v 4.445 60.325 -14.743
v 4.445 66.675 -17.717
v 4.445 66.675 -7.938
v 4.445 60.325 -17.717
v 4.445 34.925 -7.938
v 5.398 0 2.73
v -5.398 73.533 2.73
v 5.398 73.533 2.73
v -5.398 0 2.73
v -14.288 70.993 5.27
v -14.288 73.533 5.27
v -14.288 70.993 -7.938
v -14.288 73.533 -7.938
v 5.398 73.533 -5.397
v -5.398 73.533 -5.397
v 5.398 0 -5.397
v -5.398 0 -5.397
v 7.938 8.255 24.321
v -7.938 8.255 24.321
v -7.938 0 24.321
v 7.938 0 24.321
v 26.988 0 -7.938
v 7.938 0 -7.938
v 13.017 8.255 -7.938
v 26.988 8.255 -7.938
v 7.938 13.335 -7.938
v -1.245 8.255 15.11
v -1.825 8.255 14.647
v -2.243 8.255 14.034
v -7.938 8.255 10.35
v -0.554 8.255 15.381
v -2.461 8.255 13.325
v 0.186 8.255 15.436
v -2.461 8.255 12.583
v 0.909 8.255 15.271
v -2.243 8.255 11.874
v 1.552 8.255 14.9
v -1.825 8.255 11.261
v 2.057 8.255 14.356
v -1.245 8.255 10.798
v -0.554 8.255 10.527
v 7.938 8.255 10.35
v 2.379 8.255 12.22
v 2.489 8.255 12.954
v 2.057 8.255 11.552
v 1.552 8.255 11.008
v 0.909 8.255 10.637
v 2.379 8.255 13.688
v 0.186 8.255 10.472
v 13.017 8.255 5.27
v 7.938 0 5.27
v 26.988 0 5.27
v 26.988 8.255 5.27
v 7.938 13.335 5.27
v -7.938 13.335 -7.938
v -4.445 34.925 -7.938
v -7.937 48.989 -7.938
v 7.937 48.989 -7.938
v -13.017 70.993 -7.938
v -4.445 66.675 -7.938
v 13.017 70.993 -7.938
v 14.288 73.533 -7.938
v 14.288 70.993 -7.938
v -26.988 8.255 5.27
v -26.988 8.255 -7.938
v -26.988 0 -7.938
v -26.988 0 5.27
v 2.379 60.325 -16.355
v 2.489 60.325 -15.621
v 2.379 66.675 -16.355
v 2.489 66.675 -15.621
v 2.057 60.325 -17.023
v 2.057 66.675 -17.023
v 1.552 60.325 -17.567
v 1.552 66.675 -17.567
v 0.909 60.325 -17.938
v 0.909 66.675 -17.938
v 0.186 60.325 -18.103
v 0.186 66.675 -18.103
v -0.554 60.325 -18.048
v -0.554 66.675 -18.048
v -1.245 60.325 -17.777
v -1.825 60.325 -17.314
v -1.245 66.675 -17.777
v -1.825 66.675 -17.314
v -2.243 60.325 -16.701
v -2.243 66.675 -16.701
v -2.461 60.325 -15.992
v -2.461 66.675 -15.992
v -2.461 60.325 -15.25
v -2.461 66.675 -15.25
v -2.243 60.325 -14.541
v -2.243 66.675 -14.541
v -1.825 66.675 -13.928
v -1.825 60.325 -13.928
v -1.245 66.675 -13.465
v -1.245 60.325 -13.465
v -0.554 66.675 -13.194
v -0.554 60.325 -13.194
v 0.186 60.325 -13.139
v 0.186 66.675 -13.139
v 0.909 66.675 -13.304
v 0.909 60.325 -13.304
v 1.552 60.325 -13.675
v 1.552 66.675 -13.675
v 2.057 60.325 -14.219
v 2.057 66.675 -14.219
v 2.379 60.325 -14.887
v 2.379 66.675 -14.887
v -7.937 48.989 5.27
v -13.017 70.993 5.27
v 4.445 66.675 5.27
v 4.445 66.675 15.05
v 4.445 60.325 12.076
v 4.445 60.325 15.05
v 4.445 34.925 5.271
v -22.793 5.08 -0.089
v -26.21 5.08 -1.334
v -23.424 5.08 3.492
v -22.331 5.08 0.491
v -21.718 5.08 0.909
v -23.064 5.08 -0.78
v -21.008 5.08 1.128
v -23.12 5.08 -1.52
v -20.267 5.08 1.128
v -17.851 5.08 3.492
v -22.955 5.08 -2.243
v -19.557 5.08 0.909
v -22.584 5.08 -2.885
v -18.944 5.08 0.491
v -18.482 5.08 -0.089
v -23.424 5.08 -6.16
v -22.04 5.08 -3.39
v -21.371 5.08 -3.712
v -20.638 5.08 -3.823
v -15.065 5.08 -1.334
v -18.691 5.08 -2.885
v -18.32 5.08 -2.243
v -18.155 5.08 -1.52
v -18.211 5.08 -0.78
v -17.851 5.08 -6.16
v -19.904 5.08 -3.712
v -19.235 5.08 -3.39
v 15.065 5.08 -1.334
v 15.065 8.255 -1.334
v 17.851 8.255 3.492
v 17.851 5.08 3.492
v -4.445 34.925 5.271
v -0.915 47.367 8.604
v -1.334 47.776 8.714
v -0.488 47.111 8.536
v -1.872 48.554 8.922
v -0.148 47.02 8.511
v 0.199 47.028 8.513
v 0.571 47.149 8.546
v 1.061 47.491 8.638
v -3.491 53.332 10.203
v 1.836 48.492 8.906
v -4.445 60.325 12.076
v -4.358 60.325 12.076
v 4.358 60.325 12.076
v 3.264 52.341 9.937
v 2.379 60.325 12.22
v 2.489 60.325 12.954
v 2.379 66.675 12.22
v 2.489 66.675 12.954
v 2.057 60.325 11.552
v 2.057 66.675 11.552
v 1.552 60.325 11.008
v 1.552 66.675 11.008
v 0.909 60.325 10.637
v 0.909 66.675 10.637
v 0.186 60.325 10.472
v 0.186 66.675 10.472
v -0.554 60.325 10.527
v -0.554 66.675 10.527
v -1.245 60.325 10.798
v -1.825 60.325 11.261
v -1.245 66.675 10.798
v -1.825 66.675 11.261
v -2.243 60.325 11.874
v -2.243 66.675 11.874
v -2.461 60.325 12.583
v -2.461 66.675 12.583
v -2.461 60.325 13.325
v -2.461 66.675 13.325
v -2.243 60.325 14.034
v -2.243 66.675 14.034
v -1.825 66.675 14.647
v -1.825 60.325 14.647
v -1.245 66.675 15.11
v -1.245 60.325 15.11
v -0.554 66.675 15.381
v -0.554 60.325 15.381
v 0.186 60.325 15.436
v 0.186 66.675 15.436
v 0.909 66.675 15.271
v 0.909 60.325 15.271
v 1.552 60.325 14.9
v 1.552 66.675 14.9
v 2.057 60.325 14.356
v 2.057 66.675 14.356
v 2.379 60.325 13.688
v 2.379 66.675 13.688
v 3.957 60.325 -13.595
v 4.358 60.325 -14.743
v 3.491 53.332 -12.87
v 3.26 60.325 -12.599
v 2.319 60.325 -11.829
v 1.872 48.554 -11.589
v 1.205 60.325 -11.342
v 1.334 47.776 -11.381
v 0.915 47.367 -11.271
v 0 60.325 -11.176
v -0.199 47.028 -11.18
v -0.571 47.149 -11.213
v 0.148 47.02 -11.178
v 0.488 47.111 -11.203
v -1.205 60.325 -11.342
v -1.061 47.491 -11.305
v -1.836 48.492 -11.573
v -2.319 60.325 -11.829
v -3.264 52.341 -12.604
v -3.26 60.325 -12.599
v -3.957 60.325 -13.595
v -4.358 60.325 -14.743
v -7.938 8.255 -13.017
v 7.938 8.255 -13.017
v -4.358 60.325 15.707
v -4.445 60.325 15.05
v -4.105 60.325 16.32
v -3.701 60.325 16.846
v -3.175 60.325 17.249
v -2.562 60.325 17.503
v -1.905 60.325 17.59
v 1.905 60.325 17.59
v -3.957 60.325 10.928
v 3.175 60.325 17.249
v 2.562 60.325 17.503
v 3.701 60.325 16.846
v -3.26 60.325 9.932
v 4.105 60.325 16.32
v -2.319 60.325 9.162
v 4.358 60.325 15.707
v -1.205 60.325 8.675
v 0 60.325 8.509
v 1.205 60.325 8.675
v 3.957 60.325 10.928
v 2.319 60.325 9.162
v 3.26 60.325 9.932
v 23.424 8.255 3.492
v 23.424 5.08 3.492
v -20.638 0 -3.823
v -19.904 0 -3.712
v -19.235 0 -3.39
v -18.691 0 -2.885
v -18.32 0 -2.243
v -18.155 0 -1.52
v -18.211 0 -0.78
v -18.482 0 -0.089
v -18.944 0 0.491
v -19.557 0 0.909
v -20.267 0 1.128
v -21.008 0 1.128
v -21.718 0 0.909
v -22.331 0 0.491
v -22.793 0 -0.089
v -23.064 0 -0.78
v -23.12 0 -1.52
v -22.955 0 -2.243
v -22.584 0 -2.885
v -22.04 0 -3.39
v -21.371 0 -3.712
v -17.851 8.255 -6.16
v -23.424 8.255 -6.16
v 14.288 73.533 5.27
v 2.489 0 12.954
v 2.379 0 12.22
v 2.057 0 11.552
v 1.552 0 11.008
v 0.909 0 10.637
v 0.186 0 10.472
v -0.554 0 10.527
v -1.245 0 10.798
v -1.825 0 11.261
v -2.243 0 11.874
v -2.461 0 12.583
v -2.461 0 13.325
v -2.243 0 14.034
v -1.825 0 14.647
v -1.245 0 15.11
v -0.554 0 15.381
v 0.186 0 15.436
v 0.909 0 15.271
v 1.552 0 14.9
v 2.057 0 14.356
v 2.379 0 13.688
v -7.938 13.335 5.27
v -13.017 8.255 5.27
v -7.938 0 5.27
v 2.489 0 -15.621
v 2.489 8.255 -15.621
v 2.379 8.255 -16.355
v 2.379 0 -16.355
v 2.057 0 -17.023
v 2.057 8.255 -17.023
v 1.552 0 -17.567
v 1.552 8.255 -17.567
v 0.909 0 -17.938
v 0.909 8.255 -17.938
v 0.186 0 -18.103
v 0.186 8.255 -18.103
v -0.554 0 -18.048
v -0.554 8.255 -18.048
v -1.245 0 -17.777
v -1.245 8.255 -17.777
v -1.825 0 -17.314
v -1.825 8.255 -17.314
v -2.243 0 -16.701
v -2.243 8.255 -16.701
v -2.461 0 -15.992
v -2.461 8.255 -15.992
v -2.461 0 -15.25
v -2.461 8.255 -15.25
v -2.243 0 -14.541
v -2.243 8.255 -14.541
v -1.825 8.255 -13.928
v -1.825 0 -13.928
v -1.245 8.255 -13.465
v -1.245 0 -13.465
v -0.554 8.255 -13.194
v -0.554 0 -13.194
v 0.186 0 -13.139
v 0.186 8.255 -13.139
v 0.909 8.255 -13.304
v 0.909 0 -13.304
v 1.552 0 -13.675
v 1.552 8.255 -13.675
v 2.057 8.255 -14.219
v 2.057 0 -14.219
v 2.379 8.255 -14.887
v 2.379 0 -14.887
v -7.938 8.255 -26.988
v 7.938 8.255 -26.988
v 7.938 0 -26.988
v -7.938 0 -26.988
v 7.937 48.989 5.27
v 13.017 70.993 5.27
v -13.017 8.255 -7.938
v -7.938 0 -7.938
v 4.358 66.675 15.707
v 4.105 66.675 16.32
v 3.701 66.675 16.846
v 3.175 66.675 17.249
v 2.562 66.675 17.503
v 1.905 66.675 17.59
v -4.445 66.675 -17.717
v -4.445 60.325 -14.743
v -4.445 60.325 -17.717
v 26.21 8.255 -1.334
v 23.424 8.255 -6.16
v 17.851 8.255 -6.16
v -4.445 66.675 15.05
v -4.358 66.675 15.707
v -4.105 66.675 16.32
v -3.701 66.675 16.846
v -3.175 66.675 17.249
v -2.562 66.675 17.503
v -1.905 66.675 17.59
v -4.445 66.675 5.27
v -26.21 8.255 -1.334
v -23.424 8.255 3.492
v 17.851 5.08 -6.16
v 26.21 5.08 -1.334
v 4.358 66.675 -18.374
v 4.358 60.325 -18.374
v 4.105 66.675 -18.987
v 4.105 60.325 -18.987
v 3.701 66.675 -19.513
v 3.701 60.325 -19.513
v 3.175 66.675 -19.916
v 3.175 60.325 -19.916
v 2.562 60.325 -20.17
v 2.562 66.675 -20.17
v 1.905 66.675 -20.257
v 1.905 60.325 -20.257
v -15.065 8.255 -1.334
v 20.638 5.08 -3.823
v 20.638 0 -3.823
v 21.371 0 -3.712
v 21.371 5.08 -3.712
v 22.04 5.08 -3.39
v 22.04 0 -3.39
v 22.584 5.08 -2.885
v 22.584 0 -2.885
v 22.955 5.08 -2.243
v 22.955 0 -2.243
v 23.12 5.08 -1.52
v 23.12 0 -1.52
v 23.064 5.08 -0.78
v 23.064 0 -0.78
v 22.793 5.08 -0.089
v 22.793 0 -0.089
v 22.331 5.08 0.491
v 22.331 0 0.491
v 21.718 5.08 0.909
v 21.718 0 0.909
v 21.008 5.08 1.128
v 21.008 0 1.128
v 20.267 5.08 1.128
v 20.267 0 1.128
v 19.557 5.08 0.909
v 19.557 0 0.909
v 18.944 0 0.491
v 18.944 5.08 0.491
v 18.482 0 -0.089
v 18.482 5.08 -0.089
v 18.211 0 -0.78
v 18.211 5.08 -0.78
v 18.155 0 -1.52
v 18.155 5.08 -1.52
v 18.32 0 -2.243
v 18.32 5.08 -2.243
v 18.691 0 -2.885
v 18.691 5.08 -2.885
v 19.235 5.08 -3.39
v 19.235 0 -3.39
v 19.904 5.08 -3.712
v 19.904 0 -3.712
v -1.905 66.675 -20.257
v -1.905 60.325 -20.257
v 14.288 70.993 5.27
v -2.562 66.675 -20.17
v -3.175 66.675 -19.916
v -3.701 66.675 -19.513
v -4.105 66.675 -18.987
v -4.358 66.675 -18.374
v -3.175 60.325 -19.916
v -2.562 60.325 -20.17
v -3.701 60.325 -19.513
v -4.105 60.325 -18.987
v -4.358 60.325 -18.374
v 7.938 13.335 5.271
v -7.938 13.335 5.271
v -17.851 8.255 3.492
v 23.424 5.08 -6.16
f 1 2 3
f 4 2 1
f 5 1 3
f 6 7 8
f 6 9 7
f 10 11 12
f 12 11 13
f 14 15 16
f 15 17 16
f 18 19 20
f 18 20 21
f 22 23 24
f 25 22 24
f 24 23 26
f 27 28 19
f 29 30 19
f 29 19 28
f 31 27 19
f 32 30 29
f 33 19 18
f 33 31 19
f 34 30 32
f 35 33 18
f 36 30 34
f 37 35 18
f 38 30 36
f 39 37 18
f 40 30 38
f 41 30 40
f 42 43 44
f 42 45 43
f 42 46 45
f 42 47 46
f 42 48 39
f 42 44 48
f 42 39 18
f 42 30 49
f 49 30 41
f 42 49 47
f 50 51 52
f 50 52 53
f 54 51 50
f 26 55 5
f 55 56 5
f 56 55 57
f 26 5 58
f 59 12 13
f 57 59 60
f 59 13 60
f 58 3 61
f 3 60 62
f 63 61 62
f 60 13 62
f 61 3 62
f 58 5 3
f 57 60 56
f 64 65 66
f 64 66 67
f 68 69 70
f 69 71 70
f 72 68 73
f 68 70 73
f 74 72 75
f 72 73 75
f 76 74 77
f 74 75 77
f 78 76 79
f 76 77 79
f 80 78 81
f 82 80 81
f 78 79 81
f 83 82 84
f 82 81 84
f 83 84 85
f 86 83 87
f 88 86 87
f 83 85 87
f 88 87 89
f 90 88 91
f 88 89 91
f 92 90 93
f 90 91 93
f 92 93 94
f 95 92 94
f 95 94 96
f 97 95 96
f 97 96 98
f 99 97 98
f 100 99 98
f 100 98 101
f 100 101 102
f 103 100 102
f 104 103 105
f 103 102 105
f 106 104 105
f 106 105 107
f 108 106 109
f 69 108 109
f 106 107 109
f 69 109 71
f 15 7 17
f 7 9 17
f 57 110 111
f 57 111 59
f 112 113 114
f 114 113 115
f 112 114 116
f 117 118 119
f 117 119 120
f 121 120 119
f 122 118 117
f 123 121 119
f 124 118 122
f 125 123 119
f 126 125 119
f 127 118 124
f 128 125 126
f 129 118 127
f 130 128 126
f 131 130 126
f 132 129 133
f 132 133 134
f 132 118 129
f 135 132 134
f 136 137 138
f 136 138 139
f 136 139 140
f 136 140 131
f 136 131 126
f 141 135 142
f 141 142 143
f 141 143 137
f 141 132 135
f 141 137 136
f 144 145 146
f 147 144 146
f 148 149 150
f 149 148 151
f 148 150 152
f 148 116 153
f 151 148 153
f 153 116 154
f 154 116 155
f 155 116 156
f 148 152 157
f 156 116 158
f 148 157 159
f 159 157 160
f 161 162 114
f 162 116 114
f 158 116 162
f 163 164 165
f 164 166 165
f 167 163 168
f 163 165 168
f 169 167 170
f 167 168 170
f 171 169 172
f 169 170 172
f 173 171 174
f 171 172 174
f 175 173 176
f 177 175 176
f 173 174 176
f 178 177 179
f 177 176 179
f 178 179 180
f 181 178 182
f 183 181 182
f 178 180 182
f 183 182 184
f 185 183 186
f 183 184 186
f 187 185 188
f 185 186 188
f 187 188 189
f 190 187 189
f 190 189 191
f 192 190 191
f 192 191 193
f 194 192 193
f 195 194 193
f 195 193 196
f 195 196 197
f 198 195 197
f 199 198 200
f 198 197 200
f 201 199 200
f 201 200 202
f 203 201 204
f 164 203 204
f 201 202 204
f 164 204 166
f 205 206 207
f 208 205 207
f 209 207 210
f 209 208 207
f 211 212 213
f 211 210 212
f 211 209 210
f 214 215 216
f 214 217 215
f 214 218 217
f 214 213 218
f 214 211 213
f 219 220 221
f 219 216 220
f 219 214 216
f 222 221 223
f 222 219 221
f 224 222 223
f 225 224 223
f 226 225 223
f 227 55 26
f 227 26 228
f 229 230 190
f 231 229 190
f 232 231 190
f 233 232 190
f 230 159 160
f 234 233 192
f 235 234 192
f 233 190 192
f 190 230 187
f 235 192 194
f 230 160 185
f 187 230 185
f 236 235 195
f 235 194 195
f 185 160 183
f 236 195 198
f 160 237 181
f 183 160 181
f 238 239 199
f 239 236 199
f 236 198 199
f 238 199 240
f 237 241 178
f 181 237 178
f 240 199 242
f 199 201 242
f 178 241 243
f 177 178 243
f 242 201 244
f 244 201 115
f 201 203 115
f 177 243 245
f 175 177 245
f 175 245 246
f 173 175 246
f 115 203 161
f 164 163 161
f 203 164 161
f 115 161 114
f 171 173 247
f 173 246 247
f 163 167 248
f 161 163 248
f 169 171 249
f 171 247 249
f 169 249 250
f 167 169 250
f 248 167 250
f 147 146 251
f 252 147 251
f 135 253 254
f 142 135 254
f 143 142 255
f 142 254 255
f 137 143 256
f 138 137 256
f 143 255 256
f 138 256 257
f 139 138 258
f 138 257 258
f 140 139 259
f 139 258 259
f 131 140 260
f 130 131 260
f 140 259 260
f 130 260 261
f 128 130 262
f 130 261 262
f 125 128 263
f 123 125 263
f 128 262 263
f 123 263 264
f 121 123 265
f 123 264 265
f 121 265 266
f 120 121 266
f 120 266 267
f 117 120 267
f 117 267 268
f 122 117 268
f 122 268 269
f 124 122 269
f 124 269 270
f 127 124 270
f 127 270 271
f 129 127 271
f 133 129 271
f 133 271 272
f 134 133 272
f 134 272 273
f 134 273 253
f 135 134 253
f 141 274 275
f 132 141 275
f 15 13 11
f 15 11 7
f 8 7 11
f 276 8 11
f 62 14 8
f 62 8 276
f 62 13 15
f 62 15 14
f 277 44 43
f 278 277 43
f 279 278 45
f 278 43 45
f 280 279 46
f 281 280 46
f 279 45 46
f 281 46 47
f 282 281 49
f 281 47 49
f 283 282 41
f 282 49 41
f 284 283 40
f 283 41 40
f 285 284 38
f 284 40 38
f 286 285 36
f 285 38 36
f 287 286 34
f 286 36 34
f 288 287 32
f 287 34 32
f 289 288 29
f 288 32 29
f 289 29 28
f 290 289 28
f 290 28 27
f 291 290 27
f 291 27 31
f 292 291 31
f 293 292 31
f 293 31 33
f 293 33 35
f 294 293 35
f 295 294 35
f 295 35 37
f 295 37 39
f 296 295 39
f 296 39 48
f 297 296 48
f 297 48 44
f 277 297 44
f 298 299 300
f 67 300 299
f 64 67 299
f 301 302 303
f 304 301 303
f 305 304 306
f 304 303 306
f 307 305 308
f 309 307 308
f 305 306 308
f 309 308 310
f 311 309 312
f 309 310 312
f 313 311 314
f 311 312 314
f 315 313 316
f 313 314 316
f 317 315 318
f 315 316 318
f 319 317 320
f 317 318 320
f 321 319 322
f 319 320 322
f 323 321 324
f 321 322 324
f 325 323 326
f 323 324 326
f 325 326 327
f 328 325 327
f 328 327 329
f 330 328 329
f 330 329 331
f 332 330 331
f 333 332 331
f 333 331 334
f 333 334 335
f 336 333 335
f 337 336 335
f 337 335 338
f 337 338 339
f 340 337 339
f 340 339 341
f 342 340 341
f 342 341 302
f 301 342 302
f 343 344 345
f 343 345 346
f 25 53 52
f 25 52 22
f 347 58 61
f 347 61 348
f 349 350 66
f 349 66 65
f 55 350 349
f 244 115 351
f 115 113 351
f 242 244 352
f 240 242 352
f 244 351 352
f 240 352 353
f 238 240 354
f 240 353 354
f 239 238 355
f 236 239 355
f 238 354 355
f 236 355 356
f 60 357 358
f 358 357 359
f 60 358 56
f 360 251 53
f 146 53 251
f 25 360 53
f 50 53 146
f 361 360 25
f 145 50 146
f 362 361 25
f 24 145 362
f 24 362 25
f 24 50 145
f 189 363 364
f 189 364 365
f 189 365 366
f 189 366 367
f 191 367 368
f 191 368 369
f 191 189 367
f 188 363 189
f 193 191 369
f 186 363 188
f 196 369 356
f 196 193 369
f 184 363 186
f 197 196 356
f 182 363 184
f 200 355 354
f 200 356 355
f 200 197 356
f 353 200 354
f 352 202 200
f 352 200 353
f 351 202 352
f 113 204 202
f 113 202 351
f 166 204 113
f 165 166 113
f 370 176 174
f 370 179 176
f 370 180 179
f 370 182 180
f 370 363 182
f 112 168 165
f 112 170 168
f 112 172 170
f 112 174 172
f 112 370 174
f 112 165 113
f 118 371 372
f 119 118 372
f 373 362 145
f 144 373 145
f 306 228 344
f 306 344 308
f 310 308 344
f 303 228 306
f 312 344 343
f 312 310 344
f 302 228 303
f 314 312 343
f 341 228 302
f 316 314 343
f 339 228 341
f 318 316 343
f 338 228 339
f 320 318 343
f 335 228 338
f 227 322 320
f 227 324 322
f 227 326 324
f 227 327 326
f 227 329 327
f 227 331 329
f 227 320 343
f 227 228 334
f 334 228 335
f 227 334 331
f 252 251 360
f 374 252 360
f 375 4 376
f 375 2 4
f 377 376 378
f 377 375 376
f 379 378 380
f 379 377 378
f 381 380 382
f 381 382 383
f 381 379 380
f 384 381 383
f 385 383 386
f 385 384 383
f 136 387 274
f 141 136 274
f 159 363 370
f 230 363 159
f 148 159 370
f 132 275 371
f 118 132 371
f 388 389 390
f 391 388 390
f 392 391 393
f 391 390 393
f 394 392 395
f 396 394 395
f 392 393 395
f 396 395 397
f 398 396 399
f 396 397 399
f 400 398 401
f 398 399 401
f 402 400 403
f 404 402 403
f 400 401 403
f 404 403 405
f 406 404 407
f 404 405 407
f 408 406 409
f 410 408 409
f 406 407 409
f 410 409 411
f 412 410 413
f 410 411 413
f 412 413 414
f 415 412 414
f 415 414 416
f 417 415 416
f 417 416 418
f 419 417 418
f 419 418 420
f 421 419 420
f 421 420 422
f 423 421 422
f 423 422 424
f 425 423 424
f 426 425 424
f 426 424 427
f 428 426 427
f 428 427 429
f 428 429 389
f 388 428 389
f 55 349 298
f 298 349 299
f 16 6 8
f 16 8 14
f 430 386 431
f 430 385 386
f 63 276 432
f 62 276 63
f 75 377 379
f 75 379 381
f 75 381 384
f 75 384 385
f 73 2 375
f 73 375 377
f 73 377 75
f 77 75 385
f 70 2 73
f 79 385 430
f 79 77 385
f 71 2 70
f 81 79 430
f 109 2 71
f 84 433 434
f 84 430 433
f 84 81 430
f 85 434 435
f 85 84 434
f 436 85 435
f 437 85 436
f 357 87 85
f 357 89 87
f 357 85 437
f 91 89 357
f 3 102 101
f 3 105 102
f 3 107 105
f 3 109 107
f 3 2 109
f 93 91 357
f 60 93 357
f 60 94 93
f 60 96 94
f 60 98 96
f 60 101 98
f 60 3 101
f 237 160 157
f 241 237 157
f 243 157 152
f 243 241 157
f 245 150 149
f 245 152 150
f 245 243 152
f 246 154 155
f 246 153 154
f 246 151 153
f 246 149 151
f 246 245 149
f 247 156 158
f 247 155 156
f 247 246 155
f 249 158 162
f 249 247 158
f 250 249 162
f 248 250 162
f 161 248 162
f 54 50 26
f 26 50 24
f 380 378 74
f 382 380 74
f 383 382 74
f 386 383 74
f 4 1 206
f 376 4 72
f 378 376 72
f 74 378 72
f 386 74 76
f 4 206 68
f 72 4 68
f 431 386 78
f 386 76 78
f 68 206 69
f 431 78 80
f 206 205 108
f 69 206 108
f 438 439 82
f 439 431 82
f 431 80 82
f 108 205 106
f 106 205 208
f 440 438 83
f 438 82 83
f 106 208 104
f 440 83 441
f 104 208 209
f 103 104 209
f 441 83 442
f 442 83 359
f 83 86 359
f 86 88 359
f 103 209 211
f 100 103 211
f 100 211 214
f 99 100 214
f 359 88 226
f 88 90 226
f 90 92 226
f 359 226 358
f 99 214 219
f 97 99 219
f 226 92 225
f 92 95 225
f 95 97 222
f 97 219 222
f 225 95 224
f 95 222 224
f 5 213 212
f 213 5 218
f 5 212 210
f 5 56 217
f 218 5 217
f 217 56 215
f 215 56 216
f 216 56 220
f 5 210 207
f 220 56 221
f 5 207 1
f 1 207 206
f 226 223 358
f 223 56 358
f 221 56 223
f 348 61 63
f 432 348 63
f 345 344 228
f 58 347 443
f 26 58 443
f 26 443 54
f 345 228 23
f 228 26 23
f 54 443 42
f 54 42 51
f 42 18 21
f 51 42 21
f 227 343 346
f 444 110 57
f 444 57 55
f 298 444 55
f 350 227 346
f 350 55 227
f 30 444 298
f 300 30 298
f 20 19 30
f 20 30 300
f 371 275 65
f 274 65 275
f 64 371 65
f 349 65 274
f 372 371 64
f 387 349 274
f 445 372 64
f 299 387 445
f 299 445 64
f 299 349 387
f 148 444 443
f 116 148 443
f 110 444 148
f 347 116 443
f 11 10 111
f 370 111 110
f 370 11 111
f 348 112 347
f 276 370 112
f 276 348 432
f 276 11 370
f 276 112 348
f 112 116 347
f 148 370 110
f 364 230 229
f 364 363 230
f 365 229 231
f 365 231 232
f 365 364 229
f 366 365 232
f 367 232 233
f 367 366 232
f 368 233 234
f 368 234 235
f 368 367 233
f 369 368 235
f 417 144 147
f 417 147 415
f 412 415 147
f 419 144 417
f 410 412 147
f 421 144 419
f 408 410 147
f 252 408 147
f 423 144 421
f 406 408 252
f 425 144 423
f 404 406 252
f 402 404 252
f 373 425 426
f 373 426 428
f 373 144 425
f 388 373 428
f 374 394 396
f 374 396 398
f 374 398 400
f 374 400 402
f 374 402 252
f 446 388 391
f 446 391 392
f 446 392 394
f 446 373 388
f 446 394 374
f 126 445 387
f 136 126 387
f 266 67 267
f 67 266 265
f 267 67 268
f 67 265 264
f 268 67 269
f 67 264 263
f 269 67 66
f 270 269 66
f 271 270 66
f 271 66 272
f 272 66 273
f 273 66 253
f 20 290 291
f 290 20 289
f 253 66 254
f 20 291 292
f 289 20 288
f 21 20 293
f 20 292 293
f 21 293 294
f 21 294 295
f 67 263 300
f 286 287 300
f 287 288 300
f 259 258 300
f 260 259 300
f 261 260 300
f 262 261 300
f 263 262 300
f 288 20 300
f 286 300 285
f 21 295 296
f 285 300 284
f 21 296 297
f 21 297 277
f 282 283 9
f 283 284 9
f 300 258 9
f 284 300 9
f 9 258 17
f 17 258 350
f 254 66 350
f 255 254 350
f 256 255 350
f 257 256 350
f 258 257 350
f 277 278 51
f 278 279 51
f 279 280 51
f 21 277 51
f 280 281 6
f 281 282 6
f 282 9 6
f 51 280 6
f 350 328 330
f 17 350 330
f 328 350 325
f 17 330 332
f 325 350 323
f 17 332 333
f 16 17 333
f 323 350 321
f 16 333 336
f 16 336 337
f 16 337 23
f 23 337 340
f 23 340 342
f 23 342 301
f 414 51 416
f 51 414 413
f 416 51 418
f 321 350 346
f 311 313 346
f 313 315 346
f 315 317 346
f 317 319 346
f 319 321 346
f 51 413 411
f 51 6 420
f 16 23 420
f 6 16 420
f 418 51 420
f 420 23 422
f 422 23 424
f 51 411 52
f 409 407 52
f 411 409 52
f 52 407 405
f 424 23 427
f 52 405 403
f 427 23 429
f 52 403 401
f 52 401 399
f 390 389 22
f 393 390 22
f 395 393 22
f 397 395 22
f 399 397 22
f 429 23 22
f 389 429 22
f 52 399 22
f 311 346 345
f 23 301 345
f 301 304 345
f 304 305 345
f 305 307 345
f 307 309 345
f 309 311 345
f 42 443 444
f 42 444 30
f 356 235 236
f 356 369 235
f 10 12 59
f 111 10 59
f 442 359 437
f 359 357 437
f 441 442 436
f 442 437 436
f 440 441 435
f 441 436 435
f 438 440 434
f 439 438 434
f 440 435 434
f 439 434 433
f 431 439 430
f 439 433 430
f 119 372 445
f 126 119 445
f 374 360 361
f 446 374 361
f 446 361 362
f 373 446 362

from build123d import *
from OCP.BRepFilletAPI import BRepFilletAPI_MakeChamfer

# Parameters (mm, degrees)
SKETCH1_W           = 15.875
SKETCH1_H           = 13.208
BOSS_EXTRUDE1_DEPTH = 73.533
SHELL1_T            = -2.54
SKETCH3_W           = 8.89
SKETCH3_H           = 6.35
BOSS_EXTRUDE2_DEPTH = 12.319
SKETCH4_W           = 8.89
SKETCH4_H           = 6.35
BOSS_EXTRUDE3_DEPTH = 12.319
SKETCH5_W           = 13.208
SKETCH5_H           = 8.255
BOSS_EXTRUDE4_DEPTH = 19.05
SKETCH6_W           = 15.875
SKETCH6_H           = 8.255
BOSS_EXTRUDE5_DEPTH = 19.05
SKETCH7_W           = 13.208
SKETCH7_H           = 8.255
BOSS_EXTRUDE6_DEPTH = 19.05
SKETCH8_W           = 15.875
SKETCH8_H           = 8.255
BOSS_EXTRUDE7_DEPTH = 19.05
SKETCH9_R           = 2.4892
CUT_EXTRUDE1_DEPTH  = 83.847766424
CUT_EXTRUDE2_REACH  = 84.848
SKETCH11_R          = 2.4892
FILLET3_R           = 2.54
CHAMFER2_SIZE       = 25.4
CHAMFER2_SIZE_2     = 6.805909488
SKETCH12_R          = 4.445
CUT_EXTRUDE3_DEPTH  = 52.07
SKETCH13_W          = 28.575
SKETCH13_H          = 13.208
SKETCH13_W_2        = 10.795
SKETCH13_H_2        = 8.128
BOSS_EXTRUDE8_DEPTH = 2.54
CHAMFER3_SIZE       = 5.08
CHAMFER3_SIZE2      = 22.003897441
CHAMFER4_SIZE       = 5.08
CHAMFER5_SIZE       = 5.08
CUT_EXTRUDE4_DEPTH  = 3.175
CUT_EXTRUDE5_DEPTH  = 3.175


# Some blends are built 0.0001 mm under size
with BuildPart() as part:
    # Sketch1 → Boss-Extrude1 (new body)
    with BuildSketch(Plane(origin=(0, 0, 0), x_dir=(1, 0, 0), z_dir=(0, 1, 0))):
        with Locations((0, 1.3335)):
            Rectangle(SKETCH1_W, SKETCH1_H)
    extrude(amount=BOSS_EXTRUDE1_DEPTH)

    # Shell1
    shell1_openings = [part.faces().sort_by_distance(p)[0] for p in [
        (0, 73.533, -1.3335),
        (0, 0, -1.3335),
    ]]
    offset(amount=SHELL1_T, openings=shell1_openings, kind=Kind.INTERSECTION)

    # Sketch3 → Boss-Extrude2 (add)
    with BuildSketch(Plane(origin=(0, 0, -7.9375), x_dir=(-1, 0, 0), z_dir=(0, 0, -1))):
        with Locations((0, 63.5)):
            Rectangle(SKETCH3_W, SKETCH3_H)
    extrude(amount=BOSS_EXTRUDE2_DEPTH)

    # Sketch4 → Boss-Extrude3 (add)
    with BuildSketch(Plane.XY.offset(5.2705)):
        with Locations((0, 63.5)):
            Rectangle(SKETCH4_W, SKETCH4_H)
    extrude(amount=BOSS_EXTRUDE3_DEPTH)

    # Sketch5 → Boss-Extrude4 (add)
    with BuildSketch(Plane.ZY.offset(7.9375)):
        with Locations((-1.3335, 4.1275)):
            Rectangle(SKETCH5_W, SKETCH5_H)
    extrude(amount=BOSS_EXTRUDE4_DEPTH)

    # Sketch6 → Boss-Extrude5 (add)
    with BuildSketch(Plane(origin=(0, 0, -7.9375), x_dir=(-1, 0, 0), z_dir=(0, 0, -1))):
        with Locations((0, 4.1275)):
            Rectangle(SKETCH6_W, SKETCH6_H)
    extrude(amount=BOSS_EXTRUDE5_DEPTH)

    # Sketch7 → Boss-Extrude6 (add)
    with BuildSketch(Plane(origin=(7.9375, 0, 0), x_dir=(0, 0, -1), z_dir=(1, 0, 0))):
        with Locations((1.3335, 4.1275)):
            Rectangle(SKETCH7_W, SKETCH7_H)
    extrude(amount=BOSS_EXTRUDE6_DEPTH)

    # Sketch8 → Boss-Extrude7 (add)
    with BuildSketch(Plane.XY.offset(5.2705)):
        with Locations((0, 4.1275)):
            Rectangle(SKETCH8_W, SKETCH8_H)
    extrude(amount=BOSS_EXTRUDE7_DEPTH)

    # Sketch9 → Cut-Extrude1 (cut, through all)
    with BuildSketch(Plane(origin=(0, 73.533, 0), x_dir=(1, 0, 0), z_dir=(0, 1, 0))):
        with Locations((0, 15.621)):
            Circle(SKETCH9_R)
        with Locations((0, -12.954)):
            Circle(SKETCH9_R)
    extrude(amount=-CUT_EXTRUDE1_DEPTH, mode=Mode.SUBTRACT)

    # Sketch11 → Cut-Extrude2 (cut, up to next)
    with BuildSketch(Plane(origin=(0, 0, 0), x_dir=(-1, 0, 0), z_dir=(0, -1, 0)), mode=Mode.PRIVATE) as cut_extrude2_sk1:
        with Locations(Location((20.6375, 1.3335, 0), (0, 0, 90))):
            Circle(SKETCH11_R)
    cut_extrude2_tool1 = extrude(cut_extrude2_sk1.sketch, amount=-CUT_EXTRUDE2_REACH, mode=Mode.PRIVATE) & part.part
    # Sketch11 → Cut-Extrude2 (cut, up to next)
    with BuildSketch(Plane(origin=(0, 0, 0), x_dir=(-1, 0, 0), z_dir=(0, -1, 0)), mode=Mode.PRIVATE) as cut_extrude2_sk2:
        with Locations(Location((-20.6375, 1.3335, 0), (0, 0, 90))):
            Circle(SKETCH11_R)
    cut_extrude2_tool2 = extrude(cut_extrude2_sk2.sketch, amount=-CUT_EXTRUDE2_REACH, mode=Mode.PRIVATE) & part.part
    add(cut_extrude2_tool1.solids().sort_by_distance((-20.6375, 0, -1.3335))[0], mode=Mode.SUBTRACT)
    add(cut_extrude2_tool2.solids().sort_by_distance((20.6375, 0, -1.3335))[0], mode=Mode.SUBTRACT)

    # Fillet3
    fillet3_edges = [part.edges().sort_by_distance(p)[0] for p in [
        (4.445, 63.5, -20.2565),
        (-4.445, 63.5, -20.2565),
        (4.445, 63.5, 17.5895),
        (-4.445, 63.5, 17.5895),
    ]]
    fillet(fillet3_edges, radius=FILLET3_R)

    # Chamfer2
    # the kernel refuses this chamfer: 25.4, 6.805909488 mm, written as the material it adds along each edge
    with BuildSketch(Plane(origin=(-4.445, 60.325, -7.9375), x_dir=(0, -0.9999503267608393, 0.00996714657715642), z_dir=(1, 0, 0))) as chamfer2_piece_1_section:
        Polygon((CHAMFER2_SIZE * 0.999950326761, CHAMFER2_SIZE * 0.00996714657716), (-CHAMFER2_SIZE_2 * 0.00996714657679, CHAMFER2_SIZE_2 * 0.999950326724), (0, 0), align=None)
    chamfer2_piece_1 = extrude(amount=8.89, mode=Mode.PRIVATE)
    chamfer2_piece_1 = chamfer2_piece_1 - Plane(origin=(0, 51.301210878, -15.621), x_dir=(1, 0, 0), z_dir=(0, 1, 0)) * Cylinder(2.4892, 120, mode=Mode.PRIVATE)
    add(chamfer2_piece_1)
    with BuildSketch(Plane(origin=(4.445, 60.325, 5.2705), x_dir=(0, -0.9999503267608393, -0.00996714657715642), z_dir=(-1, 0, 0))) as chamfer2_piece_2_section:
        Polygon((CHAMFER2_SIZE * 0.999950326761, CHAMFER2_SIZE * 0.00996714657716), (-CHAMFER2_SIZE_2 * 0.00996714657679, CHAMFER2_SIZE_2 * 0.999950326724), (0, 0), align=None)
    chamfer2_piece_2 = extrude(amount=8.89, mode=Mode.PRIVATE)
    chamfer2_piece_2 = chamfer2_piece_2 - Plane(origin=(0, 51.301210878, 12.954), x_dir=(1, 0, 0), z_dir=(0, 1, 0)) * Cylinder(2.4892, 120, mode=Mode.PRIVATE)
    add(chamfer2_piece_2)

    # Sketch12 → Cut-Extrude3 (cut)
    with BuildSketch(Plane.XZ.offset(-60.325)):
        with Locations((0, -15.621)):
            Circle(SKETCH12_R)
        with Locations((0, 12.954)):
            Circle(SKETCH12_R)
    extrude(amount=CUT_EXTRUDE3_DEPTH, mode=Mode.SUBTRACT)

    # Sketch13 → Boss-Extrude8 (add)
    with BuildSketch(Plane(origin=(0, 73.533, 0), x_dir=(1, 0, 0), z_dir=(0, 1, 0))):
        with Locations((0, 1.3335)):
            Rectangle(SKETCH13_W, SKETCH13_H)
        with Locations((0, 1.3335)):
            Rectangle(SKETCH13_W_2, SKETCH13_H_2, mode=Mode.SUBTRACT)
    extrude(amount=-BOSS_EXTRUDE8_DEPTH)

    # Chamfer3: one chamfer whose edges measure the first distance from different faces: ONE call of the kernel's chamfer builder (chamfer() names one face for all edges)
    chamfer3_edges_1 = [part.edges().sort_by_distance(p)[0] for p in [
        (7.9375, 70.993, -1.3335),
    ]]
    chamfer3_side_1 = [part.faces().sort_by_distance(p)[0] for p in [
        (11.1125, 70.993, -1.3335),
    ]]
    chamfer3_edges_2 = [part.edges().sort_by_distance(p)[0] for p in [
        (-7.9375, 70.993, -1.3335),
    ]]
    chamfer3_side_2 = [part.faces().sort_by_distance(p)[0] for p in [
        (-11.1125, 70.993, -1.3335),
    ]]
    chamfer3 = BRepFilletAPI_MakeChamfer(part.part.solid().wrapped)
    for e in chamfer3_edges_1:
        chamfer3.Add(CHAMFER3_SIZE, CHAMFER3_SIZE2, e.wrapped, chamfer3_side_1[0].wrapped)  # the first distance lies on this face
    for e in chamfer3_edges_2:
        chamfer3.Add(CHAMFER3_SIZE, CHAMFER3_SIZE2, e.wrapped, chamfer3_side_2[0].wrapped)  # the first distance lies on this face
    add(Compound.cast(chamfer3.Shape()), mode=Mode.REPLACE)

    # Chamfer4
    # the kernel refuses this chamfer: 5.08 mm, written as the material it adds along each edge
    with BuildSketch(Plane(origin=(-7.9375, 8.255, -7.9375), x_dir=(0, 0.9996219169112968, 0.027495876610586438), z_dir=(1, 0, 0)), Plane(origin=(7.9375, 8.255, 5.2705), x_dir=(0, 0.9996219169112968, -0.027495876610586438), z_dir=(-1, 0, 0))) as chamfer4_piece_1:
        Polygon((CHAMFER4_SIZE * 0.999621916911, -CHAMFER4_SIZE * 0.0274958766106), (-CHAMFER4_SIZE * 0.0274958766106, -CHAMFER4_SIZE * 0.999621916911), (0, 0), align=None)
    extrude(amount=15.875)

    # Chamfer5
    chamfer5_edges = [part.edges().sort_by_distance(p)[0] for p in [
        (-7.9375, 8.255, -1.3335),
        (7.9375, 8.255, -1.3335),
    ]]
    chamfer(chamfer5_edges, length=CHAMFER5_SIZE - 0.0001)  # a hair under: the kernel refuses the full size

    # Sketch14 → Cut-Extrude4 (cut)
    with BuildSketch(Plane(origin=(0, 8.255, 0), x_dir=(1, 0, 0), z_dir=(0, 1, 0))):
        Polygon((-26.210084798, 1.3335), (-23.423792399, -3.4925), (-17.851207601, -3.4925), (-15.064915202, 1.3335), (-17.851207601, 6.1595), (-23.423792399, 6.1595), align=None)
    extrude(amount=-CUT_EXTRUDE4_DEPTH, mode=Mode.SUBTRACT)

    # Sketch15 → Cut-Extrude5 (cut)
    with BuildSketch(Plane(origin=(0, 8.255, 0), x_dir=(1, 0, 0), z_dir=(0, 1, 0))):
        Polygon((15.064915202, 1.3335), (17.851207601, -3.4925), (23.423792399, -3.4925), (26.210084798, 1.3335), (23.423792399, 6.1595), (17.851207601, 6.1595), align=None)
    extrude(amount=-CUT_EXTRUDE5_DEPTH, mode=Mode.SUBTRACT)


solid = part.part
